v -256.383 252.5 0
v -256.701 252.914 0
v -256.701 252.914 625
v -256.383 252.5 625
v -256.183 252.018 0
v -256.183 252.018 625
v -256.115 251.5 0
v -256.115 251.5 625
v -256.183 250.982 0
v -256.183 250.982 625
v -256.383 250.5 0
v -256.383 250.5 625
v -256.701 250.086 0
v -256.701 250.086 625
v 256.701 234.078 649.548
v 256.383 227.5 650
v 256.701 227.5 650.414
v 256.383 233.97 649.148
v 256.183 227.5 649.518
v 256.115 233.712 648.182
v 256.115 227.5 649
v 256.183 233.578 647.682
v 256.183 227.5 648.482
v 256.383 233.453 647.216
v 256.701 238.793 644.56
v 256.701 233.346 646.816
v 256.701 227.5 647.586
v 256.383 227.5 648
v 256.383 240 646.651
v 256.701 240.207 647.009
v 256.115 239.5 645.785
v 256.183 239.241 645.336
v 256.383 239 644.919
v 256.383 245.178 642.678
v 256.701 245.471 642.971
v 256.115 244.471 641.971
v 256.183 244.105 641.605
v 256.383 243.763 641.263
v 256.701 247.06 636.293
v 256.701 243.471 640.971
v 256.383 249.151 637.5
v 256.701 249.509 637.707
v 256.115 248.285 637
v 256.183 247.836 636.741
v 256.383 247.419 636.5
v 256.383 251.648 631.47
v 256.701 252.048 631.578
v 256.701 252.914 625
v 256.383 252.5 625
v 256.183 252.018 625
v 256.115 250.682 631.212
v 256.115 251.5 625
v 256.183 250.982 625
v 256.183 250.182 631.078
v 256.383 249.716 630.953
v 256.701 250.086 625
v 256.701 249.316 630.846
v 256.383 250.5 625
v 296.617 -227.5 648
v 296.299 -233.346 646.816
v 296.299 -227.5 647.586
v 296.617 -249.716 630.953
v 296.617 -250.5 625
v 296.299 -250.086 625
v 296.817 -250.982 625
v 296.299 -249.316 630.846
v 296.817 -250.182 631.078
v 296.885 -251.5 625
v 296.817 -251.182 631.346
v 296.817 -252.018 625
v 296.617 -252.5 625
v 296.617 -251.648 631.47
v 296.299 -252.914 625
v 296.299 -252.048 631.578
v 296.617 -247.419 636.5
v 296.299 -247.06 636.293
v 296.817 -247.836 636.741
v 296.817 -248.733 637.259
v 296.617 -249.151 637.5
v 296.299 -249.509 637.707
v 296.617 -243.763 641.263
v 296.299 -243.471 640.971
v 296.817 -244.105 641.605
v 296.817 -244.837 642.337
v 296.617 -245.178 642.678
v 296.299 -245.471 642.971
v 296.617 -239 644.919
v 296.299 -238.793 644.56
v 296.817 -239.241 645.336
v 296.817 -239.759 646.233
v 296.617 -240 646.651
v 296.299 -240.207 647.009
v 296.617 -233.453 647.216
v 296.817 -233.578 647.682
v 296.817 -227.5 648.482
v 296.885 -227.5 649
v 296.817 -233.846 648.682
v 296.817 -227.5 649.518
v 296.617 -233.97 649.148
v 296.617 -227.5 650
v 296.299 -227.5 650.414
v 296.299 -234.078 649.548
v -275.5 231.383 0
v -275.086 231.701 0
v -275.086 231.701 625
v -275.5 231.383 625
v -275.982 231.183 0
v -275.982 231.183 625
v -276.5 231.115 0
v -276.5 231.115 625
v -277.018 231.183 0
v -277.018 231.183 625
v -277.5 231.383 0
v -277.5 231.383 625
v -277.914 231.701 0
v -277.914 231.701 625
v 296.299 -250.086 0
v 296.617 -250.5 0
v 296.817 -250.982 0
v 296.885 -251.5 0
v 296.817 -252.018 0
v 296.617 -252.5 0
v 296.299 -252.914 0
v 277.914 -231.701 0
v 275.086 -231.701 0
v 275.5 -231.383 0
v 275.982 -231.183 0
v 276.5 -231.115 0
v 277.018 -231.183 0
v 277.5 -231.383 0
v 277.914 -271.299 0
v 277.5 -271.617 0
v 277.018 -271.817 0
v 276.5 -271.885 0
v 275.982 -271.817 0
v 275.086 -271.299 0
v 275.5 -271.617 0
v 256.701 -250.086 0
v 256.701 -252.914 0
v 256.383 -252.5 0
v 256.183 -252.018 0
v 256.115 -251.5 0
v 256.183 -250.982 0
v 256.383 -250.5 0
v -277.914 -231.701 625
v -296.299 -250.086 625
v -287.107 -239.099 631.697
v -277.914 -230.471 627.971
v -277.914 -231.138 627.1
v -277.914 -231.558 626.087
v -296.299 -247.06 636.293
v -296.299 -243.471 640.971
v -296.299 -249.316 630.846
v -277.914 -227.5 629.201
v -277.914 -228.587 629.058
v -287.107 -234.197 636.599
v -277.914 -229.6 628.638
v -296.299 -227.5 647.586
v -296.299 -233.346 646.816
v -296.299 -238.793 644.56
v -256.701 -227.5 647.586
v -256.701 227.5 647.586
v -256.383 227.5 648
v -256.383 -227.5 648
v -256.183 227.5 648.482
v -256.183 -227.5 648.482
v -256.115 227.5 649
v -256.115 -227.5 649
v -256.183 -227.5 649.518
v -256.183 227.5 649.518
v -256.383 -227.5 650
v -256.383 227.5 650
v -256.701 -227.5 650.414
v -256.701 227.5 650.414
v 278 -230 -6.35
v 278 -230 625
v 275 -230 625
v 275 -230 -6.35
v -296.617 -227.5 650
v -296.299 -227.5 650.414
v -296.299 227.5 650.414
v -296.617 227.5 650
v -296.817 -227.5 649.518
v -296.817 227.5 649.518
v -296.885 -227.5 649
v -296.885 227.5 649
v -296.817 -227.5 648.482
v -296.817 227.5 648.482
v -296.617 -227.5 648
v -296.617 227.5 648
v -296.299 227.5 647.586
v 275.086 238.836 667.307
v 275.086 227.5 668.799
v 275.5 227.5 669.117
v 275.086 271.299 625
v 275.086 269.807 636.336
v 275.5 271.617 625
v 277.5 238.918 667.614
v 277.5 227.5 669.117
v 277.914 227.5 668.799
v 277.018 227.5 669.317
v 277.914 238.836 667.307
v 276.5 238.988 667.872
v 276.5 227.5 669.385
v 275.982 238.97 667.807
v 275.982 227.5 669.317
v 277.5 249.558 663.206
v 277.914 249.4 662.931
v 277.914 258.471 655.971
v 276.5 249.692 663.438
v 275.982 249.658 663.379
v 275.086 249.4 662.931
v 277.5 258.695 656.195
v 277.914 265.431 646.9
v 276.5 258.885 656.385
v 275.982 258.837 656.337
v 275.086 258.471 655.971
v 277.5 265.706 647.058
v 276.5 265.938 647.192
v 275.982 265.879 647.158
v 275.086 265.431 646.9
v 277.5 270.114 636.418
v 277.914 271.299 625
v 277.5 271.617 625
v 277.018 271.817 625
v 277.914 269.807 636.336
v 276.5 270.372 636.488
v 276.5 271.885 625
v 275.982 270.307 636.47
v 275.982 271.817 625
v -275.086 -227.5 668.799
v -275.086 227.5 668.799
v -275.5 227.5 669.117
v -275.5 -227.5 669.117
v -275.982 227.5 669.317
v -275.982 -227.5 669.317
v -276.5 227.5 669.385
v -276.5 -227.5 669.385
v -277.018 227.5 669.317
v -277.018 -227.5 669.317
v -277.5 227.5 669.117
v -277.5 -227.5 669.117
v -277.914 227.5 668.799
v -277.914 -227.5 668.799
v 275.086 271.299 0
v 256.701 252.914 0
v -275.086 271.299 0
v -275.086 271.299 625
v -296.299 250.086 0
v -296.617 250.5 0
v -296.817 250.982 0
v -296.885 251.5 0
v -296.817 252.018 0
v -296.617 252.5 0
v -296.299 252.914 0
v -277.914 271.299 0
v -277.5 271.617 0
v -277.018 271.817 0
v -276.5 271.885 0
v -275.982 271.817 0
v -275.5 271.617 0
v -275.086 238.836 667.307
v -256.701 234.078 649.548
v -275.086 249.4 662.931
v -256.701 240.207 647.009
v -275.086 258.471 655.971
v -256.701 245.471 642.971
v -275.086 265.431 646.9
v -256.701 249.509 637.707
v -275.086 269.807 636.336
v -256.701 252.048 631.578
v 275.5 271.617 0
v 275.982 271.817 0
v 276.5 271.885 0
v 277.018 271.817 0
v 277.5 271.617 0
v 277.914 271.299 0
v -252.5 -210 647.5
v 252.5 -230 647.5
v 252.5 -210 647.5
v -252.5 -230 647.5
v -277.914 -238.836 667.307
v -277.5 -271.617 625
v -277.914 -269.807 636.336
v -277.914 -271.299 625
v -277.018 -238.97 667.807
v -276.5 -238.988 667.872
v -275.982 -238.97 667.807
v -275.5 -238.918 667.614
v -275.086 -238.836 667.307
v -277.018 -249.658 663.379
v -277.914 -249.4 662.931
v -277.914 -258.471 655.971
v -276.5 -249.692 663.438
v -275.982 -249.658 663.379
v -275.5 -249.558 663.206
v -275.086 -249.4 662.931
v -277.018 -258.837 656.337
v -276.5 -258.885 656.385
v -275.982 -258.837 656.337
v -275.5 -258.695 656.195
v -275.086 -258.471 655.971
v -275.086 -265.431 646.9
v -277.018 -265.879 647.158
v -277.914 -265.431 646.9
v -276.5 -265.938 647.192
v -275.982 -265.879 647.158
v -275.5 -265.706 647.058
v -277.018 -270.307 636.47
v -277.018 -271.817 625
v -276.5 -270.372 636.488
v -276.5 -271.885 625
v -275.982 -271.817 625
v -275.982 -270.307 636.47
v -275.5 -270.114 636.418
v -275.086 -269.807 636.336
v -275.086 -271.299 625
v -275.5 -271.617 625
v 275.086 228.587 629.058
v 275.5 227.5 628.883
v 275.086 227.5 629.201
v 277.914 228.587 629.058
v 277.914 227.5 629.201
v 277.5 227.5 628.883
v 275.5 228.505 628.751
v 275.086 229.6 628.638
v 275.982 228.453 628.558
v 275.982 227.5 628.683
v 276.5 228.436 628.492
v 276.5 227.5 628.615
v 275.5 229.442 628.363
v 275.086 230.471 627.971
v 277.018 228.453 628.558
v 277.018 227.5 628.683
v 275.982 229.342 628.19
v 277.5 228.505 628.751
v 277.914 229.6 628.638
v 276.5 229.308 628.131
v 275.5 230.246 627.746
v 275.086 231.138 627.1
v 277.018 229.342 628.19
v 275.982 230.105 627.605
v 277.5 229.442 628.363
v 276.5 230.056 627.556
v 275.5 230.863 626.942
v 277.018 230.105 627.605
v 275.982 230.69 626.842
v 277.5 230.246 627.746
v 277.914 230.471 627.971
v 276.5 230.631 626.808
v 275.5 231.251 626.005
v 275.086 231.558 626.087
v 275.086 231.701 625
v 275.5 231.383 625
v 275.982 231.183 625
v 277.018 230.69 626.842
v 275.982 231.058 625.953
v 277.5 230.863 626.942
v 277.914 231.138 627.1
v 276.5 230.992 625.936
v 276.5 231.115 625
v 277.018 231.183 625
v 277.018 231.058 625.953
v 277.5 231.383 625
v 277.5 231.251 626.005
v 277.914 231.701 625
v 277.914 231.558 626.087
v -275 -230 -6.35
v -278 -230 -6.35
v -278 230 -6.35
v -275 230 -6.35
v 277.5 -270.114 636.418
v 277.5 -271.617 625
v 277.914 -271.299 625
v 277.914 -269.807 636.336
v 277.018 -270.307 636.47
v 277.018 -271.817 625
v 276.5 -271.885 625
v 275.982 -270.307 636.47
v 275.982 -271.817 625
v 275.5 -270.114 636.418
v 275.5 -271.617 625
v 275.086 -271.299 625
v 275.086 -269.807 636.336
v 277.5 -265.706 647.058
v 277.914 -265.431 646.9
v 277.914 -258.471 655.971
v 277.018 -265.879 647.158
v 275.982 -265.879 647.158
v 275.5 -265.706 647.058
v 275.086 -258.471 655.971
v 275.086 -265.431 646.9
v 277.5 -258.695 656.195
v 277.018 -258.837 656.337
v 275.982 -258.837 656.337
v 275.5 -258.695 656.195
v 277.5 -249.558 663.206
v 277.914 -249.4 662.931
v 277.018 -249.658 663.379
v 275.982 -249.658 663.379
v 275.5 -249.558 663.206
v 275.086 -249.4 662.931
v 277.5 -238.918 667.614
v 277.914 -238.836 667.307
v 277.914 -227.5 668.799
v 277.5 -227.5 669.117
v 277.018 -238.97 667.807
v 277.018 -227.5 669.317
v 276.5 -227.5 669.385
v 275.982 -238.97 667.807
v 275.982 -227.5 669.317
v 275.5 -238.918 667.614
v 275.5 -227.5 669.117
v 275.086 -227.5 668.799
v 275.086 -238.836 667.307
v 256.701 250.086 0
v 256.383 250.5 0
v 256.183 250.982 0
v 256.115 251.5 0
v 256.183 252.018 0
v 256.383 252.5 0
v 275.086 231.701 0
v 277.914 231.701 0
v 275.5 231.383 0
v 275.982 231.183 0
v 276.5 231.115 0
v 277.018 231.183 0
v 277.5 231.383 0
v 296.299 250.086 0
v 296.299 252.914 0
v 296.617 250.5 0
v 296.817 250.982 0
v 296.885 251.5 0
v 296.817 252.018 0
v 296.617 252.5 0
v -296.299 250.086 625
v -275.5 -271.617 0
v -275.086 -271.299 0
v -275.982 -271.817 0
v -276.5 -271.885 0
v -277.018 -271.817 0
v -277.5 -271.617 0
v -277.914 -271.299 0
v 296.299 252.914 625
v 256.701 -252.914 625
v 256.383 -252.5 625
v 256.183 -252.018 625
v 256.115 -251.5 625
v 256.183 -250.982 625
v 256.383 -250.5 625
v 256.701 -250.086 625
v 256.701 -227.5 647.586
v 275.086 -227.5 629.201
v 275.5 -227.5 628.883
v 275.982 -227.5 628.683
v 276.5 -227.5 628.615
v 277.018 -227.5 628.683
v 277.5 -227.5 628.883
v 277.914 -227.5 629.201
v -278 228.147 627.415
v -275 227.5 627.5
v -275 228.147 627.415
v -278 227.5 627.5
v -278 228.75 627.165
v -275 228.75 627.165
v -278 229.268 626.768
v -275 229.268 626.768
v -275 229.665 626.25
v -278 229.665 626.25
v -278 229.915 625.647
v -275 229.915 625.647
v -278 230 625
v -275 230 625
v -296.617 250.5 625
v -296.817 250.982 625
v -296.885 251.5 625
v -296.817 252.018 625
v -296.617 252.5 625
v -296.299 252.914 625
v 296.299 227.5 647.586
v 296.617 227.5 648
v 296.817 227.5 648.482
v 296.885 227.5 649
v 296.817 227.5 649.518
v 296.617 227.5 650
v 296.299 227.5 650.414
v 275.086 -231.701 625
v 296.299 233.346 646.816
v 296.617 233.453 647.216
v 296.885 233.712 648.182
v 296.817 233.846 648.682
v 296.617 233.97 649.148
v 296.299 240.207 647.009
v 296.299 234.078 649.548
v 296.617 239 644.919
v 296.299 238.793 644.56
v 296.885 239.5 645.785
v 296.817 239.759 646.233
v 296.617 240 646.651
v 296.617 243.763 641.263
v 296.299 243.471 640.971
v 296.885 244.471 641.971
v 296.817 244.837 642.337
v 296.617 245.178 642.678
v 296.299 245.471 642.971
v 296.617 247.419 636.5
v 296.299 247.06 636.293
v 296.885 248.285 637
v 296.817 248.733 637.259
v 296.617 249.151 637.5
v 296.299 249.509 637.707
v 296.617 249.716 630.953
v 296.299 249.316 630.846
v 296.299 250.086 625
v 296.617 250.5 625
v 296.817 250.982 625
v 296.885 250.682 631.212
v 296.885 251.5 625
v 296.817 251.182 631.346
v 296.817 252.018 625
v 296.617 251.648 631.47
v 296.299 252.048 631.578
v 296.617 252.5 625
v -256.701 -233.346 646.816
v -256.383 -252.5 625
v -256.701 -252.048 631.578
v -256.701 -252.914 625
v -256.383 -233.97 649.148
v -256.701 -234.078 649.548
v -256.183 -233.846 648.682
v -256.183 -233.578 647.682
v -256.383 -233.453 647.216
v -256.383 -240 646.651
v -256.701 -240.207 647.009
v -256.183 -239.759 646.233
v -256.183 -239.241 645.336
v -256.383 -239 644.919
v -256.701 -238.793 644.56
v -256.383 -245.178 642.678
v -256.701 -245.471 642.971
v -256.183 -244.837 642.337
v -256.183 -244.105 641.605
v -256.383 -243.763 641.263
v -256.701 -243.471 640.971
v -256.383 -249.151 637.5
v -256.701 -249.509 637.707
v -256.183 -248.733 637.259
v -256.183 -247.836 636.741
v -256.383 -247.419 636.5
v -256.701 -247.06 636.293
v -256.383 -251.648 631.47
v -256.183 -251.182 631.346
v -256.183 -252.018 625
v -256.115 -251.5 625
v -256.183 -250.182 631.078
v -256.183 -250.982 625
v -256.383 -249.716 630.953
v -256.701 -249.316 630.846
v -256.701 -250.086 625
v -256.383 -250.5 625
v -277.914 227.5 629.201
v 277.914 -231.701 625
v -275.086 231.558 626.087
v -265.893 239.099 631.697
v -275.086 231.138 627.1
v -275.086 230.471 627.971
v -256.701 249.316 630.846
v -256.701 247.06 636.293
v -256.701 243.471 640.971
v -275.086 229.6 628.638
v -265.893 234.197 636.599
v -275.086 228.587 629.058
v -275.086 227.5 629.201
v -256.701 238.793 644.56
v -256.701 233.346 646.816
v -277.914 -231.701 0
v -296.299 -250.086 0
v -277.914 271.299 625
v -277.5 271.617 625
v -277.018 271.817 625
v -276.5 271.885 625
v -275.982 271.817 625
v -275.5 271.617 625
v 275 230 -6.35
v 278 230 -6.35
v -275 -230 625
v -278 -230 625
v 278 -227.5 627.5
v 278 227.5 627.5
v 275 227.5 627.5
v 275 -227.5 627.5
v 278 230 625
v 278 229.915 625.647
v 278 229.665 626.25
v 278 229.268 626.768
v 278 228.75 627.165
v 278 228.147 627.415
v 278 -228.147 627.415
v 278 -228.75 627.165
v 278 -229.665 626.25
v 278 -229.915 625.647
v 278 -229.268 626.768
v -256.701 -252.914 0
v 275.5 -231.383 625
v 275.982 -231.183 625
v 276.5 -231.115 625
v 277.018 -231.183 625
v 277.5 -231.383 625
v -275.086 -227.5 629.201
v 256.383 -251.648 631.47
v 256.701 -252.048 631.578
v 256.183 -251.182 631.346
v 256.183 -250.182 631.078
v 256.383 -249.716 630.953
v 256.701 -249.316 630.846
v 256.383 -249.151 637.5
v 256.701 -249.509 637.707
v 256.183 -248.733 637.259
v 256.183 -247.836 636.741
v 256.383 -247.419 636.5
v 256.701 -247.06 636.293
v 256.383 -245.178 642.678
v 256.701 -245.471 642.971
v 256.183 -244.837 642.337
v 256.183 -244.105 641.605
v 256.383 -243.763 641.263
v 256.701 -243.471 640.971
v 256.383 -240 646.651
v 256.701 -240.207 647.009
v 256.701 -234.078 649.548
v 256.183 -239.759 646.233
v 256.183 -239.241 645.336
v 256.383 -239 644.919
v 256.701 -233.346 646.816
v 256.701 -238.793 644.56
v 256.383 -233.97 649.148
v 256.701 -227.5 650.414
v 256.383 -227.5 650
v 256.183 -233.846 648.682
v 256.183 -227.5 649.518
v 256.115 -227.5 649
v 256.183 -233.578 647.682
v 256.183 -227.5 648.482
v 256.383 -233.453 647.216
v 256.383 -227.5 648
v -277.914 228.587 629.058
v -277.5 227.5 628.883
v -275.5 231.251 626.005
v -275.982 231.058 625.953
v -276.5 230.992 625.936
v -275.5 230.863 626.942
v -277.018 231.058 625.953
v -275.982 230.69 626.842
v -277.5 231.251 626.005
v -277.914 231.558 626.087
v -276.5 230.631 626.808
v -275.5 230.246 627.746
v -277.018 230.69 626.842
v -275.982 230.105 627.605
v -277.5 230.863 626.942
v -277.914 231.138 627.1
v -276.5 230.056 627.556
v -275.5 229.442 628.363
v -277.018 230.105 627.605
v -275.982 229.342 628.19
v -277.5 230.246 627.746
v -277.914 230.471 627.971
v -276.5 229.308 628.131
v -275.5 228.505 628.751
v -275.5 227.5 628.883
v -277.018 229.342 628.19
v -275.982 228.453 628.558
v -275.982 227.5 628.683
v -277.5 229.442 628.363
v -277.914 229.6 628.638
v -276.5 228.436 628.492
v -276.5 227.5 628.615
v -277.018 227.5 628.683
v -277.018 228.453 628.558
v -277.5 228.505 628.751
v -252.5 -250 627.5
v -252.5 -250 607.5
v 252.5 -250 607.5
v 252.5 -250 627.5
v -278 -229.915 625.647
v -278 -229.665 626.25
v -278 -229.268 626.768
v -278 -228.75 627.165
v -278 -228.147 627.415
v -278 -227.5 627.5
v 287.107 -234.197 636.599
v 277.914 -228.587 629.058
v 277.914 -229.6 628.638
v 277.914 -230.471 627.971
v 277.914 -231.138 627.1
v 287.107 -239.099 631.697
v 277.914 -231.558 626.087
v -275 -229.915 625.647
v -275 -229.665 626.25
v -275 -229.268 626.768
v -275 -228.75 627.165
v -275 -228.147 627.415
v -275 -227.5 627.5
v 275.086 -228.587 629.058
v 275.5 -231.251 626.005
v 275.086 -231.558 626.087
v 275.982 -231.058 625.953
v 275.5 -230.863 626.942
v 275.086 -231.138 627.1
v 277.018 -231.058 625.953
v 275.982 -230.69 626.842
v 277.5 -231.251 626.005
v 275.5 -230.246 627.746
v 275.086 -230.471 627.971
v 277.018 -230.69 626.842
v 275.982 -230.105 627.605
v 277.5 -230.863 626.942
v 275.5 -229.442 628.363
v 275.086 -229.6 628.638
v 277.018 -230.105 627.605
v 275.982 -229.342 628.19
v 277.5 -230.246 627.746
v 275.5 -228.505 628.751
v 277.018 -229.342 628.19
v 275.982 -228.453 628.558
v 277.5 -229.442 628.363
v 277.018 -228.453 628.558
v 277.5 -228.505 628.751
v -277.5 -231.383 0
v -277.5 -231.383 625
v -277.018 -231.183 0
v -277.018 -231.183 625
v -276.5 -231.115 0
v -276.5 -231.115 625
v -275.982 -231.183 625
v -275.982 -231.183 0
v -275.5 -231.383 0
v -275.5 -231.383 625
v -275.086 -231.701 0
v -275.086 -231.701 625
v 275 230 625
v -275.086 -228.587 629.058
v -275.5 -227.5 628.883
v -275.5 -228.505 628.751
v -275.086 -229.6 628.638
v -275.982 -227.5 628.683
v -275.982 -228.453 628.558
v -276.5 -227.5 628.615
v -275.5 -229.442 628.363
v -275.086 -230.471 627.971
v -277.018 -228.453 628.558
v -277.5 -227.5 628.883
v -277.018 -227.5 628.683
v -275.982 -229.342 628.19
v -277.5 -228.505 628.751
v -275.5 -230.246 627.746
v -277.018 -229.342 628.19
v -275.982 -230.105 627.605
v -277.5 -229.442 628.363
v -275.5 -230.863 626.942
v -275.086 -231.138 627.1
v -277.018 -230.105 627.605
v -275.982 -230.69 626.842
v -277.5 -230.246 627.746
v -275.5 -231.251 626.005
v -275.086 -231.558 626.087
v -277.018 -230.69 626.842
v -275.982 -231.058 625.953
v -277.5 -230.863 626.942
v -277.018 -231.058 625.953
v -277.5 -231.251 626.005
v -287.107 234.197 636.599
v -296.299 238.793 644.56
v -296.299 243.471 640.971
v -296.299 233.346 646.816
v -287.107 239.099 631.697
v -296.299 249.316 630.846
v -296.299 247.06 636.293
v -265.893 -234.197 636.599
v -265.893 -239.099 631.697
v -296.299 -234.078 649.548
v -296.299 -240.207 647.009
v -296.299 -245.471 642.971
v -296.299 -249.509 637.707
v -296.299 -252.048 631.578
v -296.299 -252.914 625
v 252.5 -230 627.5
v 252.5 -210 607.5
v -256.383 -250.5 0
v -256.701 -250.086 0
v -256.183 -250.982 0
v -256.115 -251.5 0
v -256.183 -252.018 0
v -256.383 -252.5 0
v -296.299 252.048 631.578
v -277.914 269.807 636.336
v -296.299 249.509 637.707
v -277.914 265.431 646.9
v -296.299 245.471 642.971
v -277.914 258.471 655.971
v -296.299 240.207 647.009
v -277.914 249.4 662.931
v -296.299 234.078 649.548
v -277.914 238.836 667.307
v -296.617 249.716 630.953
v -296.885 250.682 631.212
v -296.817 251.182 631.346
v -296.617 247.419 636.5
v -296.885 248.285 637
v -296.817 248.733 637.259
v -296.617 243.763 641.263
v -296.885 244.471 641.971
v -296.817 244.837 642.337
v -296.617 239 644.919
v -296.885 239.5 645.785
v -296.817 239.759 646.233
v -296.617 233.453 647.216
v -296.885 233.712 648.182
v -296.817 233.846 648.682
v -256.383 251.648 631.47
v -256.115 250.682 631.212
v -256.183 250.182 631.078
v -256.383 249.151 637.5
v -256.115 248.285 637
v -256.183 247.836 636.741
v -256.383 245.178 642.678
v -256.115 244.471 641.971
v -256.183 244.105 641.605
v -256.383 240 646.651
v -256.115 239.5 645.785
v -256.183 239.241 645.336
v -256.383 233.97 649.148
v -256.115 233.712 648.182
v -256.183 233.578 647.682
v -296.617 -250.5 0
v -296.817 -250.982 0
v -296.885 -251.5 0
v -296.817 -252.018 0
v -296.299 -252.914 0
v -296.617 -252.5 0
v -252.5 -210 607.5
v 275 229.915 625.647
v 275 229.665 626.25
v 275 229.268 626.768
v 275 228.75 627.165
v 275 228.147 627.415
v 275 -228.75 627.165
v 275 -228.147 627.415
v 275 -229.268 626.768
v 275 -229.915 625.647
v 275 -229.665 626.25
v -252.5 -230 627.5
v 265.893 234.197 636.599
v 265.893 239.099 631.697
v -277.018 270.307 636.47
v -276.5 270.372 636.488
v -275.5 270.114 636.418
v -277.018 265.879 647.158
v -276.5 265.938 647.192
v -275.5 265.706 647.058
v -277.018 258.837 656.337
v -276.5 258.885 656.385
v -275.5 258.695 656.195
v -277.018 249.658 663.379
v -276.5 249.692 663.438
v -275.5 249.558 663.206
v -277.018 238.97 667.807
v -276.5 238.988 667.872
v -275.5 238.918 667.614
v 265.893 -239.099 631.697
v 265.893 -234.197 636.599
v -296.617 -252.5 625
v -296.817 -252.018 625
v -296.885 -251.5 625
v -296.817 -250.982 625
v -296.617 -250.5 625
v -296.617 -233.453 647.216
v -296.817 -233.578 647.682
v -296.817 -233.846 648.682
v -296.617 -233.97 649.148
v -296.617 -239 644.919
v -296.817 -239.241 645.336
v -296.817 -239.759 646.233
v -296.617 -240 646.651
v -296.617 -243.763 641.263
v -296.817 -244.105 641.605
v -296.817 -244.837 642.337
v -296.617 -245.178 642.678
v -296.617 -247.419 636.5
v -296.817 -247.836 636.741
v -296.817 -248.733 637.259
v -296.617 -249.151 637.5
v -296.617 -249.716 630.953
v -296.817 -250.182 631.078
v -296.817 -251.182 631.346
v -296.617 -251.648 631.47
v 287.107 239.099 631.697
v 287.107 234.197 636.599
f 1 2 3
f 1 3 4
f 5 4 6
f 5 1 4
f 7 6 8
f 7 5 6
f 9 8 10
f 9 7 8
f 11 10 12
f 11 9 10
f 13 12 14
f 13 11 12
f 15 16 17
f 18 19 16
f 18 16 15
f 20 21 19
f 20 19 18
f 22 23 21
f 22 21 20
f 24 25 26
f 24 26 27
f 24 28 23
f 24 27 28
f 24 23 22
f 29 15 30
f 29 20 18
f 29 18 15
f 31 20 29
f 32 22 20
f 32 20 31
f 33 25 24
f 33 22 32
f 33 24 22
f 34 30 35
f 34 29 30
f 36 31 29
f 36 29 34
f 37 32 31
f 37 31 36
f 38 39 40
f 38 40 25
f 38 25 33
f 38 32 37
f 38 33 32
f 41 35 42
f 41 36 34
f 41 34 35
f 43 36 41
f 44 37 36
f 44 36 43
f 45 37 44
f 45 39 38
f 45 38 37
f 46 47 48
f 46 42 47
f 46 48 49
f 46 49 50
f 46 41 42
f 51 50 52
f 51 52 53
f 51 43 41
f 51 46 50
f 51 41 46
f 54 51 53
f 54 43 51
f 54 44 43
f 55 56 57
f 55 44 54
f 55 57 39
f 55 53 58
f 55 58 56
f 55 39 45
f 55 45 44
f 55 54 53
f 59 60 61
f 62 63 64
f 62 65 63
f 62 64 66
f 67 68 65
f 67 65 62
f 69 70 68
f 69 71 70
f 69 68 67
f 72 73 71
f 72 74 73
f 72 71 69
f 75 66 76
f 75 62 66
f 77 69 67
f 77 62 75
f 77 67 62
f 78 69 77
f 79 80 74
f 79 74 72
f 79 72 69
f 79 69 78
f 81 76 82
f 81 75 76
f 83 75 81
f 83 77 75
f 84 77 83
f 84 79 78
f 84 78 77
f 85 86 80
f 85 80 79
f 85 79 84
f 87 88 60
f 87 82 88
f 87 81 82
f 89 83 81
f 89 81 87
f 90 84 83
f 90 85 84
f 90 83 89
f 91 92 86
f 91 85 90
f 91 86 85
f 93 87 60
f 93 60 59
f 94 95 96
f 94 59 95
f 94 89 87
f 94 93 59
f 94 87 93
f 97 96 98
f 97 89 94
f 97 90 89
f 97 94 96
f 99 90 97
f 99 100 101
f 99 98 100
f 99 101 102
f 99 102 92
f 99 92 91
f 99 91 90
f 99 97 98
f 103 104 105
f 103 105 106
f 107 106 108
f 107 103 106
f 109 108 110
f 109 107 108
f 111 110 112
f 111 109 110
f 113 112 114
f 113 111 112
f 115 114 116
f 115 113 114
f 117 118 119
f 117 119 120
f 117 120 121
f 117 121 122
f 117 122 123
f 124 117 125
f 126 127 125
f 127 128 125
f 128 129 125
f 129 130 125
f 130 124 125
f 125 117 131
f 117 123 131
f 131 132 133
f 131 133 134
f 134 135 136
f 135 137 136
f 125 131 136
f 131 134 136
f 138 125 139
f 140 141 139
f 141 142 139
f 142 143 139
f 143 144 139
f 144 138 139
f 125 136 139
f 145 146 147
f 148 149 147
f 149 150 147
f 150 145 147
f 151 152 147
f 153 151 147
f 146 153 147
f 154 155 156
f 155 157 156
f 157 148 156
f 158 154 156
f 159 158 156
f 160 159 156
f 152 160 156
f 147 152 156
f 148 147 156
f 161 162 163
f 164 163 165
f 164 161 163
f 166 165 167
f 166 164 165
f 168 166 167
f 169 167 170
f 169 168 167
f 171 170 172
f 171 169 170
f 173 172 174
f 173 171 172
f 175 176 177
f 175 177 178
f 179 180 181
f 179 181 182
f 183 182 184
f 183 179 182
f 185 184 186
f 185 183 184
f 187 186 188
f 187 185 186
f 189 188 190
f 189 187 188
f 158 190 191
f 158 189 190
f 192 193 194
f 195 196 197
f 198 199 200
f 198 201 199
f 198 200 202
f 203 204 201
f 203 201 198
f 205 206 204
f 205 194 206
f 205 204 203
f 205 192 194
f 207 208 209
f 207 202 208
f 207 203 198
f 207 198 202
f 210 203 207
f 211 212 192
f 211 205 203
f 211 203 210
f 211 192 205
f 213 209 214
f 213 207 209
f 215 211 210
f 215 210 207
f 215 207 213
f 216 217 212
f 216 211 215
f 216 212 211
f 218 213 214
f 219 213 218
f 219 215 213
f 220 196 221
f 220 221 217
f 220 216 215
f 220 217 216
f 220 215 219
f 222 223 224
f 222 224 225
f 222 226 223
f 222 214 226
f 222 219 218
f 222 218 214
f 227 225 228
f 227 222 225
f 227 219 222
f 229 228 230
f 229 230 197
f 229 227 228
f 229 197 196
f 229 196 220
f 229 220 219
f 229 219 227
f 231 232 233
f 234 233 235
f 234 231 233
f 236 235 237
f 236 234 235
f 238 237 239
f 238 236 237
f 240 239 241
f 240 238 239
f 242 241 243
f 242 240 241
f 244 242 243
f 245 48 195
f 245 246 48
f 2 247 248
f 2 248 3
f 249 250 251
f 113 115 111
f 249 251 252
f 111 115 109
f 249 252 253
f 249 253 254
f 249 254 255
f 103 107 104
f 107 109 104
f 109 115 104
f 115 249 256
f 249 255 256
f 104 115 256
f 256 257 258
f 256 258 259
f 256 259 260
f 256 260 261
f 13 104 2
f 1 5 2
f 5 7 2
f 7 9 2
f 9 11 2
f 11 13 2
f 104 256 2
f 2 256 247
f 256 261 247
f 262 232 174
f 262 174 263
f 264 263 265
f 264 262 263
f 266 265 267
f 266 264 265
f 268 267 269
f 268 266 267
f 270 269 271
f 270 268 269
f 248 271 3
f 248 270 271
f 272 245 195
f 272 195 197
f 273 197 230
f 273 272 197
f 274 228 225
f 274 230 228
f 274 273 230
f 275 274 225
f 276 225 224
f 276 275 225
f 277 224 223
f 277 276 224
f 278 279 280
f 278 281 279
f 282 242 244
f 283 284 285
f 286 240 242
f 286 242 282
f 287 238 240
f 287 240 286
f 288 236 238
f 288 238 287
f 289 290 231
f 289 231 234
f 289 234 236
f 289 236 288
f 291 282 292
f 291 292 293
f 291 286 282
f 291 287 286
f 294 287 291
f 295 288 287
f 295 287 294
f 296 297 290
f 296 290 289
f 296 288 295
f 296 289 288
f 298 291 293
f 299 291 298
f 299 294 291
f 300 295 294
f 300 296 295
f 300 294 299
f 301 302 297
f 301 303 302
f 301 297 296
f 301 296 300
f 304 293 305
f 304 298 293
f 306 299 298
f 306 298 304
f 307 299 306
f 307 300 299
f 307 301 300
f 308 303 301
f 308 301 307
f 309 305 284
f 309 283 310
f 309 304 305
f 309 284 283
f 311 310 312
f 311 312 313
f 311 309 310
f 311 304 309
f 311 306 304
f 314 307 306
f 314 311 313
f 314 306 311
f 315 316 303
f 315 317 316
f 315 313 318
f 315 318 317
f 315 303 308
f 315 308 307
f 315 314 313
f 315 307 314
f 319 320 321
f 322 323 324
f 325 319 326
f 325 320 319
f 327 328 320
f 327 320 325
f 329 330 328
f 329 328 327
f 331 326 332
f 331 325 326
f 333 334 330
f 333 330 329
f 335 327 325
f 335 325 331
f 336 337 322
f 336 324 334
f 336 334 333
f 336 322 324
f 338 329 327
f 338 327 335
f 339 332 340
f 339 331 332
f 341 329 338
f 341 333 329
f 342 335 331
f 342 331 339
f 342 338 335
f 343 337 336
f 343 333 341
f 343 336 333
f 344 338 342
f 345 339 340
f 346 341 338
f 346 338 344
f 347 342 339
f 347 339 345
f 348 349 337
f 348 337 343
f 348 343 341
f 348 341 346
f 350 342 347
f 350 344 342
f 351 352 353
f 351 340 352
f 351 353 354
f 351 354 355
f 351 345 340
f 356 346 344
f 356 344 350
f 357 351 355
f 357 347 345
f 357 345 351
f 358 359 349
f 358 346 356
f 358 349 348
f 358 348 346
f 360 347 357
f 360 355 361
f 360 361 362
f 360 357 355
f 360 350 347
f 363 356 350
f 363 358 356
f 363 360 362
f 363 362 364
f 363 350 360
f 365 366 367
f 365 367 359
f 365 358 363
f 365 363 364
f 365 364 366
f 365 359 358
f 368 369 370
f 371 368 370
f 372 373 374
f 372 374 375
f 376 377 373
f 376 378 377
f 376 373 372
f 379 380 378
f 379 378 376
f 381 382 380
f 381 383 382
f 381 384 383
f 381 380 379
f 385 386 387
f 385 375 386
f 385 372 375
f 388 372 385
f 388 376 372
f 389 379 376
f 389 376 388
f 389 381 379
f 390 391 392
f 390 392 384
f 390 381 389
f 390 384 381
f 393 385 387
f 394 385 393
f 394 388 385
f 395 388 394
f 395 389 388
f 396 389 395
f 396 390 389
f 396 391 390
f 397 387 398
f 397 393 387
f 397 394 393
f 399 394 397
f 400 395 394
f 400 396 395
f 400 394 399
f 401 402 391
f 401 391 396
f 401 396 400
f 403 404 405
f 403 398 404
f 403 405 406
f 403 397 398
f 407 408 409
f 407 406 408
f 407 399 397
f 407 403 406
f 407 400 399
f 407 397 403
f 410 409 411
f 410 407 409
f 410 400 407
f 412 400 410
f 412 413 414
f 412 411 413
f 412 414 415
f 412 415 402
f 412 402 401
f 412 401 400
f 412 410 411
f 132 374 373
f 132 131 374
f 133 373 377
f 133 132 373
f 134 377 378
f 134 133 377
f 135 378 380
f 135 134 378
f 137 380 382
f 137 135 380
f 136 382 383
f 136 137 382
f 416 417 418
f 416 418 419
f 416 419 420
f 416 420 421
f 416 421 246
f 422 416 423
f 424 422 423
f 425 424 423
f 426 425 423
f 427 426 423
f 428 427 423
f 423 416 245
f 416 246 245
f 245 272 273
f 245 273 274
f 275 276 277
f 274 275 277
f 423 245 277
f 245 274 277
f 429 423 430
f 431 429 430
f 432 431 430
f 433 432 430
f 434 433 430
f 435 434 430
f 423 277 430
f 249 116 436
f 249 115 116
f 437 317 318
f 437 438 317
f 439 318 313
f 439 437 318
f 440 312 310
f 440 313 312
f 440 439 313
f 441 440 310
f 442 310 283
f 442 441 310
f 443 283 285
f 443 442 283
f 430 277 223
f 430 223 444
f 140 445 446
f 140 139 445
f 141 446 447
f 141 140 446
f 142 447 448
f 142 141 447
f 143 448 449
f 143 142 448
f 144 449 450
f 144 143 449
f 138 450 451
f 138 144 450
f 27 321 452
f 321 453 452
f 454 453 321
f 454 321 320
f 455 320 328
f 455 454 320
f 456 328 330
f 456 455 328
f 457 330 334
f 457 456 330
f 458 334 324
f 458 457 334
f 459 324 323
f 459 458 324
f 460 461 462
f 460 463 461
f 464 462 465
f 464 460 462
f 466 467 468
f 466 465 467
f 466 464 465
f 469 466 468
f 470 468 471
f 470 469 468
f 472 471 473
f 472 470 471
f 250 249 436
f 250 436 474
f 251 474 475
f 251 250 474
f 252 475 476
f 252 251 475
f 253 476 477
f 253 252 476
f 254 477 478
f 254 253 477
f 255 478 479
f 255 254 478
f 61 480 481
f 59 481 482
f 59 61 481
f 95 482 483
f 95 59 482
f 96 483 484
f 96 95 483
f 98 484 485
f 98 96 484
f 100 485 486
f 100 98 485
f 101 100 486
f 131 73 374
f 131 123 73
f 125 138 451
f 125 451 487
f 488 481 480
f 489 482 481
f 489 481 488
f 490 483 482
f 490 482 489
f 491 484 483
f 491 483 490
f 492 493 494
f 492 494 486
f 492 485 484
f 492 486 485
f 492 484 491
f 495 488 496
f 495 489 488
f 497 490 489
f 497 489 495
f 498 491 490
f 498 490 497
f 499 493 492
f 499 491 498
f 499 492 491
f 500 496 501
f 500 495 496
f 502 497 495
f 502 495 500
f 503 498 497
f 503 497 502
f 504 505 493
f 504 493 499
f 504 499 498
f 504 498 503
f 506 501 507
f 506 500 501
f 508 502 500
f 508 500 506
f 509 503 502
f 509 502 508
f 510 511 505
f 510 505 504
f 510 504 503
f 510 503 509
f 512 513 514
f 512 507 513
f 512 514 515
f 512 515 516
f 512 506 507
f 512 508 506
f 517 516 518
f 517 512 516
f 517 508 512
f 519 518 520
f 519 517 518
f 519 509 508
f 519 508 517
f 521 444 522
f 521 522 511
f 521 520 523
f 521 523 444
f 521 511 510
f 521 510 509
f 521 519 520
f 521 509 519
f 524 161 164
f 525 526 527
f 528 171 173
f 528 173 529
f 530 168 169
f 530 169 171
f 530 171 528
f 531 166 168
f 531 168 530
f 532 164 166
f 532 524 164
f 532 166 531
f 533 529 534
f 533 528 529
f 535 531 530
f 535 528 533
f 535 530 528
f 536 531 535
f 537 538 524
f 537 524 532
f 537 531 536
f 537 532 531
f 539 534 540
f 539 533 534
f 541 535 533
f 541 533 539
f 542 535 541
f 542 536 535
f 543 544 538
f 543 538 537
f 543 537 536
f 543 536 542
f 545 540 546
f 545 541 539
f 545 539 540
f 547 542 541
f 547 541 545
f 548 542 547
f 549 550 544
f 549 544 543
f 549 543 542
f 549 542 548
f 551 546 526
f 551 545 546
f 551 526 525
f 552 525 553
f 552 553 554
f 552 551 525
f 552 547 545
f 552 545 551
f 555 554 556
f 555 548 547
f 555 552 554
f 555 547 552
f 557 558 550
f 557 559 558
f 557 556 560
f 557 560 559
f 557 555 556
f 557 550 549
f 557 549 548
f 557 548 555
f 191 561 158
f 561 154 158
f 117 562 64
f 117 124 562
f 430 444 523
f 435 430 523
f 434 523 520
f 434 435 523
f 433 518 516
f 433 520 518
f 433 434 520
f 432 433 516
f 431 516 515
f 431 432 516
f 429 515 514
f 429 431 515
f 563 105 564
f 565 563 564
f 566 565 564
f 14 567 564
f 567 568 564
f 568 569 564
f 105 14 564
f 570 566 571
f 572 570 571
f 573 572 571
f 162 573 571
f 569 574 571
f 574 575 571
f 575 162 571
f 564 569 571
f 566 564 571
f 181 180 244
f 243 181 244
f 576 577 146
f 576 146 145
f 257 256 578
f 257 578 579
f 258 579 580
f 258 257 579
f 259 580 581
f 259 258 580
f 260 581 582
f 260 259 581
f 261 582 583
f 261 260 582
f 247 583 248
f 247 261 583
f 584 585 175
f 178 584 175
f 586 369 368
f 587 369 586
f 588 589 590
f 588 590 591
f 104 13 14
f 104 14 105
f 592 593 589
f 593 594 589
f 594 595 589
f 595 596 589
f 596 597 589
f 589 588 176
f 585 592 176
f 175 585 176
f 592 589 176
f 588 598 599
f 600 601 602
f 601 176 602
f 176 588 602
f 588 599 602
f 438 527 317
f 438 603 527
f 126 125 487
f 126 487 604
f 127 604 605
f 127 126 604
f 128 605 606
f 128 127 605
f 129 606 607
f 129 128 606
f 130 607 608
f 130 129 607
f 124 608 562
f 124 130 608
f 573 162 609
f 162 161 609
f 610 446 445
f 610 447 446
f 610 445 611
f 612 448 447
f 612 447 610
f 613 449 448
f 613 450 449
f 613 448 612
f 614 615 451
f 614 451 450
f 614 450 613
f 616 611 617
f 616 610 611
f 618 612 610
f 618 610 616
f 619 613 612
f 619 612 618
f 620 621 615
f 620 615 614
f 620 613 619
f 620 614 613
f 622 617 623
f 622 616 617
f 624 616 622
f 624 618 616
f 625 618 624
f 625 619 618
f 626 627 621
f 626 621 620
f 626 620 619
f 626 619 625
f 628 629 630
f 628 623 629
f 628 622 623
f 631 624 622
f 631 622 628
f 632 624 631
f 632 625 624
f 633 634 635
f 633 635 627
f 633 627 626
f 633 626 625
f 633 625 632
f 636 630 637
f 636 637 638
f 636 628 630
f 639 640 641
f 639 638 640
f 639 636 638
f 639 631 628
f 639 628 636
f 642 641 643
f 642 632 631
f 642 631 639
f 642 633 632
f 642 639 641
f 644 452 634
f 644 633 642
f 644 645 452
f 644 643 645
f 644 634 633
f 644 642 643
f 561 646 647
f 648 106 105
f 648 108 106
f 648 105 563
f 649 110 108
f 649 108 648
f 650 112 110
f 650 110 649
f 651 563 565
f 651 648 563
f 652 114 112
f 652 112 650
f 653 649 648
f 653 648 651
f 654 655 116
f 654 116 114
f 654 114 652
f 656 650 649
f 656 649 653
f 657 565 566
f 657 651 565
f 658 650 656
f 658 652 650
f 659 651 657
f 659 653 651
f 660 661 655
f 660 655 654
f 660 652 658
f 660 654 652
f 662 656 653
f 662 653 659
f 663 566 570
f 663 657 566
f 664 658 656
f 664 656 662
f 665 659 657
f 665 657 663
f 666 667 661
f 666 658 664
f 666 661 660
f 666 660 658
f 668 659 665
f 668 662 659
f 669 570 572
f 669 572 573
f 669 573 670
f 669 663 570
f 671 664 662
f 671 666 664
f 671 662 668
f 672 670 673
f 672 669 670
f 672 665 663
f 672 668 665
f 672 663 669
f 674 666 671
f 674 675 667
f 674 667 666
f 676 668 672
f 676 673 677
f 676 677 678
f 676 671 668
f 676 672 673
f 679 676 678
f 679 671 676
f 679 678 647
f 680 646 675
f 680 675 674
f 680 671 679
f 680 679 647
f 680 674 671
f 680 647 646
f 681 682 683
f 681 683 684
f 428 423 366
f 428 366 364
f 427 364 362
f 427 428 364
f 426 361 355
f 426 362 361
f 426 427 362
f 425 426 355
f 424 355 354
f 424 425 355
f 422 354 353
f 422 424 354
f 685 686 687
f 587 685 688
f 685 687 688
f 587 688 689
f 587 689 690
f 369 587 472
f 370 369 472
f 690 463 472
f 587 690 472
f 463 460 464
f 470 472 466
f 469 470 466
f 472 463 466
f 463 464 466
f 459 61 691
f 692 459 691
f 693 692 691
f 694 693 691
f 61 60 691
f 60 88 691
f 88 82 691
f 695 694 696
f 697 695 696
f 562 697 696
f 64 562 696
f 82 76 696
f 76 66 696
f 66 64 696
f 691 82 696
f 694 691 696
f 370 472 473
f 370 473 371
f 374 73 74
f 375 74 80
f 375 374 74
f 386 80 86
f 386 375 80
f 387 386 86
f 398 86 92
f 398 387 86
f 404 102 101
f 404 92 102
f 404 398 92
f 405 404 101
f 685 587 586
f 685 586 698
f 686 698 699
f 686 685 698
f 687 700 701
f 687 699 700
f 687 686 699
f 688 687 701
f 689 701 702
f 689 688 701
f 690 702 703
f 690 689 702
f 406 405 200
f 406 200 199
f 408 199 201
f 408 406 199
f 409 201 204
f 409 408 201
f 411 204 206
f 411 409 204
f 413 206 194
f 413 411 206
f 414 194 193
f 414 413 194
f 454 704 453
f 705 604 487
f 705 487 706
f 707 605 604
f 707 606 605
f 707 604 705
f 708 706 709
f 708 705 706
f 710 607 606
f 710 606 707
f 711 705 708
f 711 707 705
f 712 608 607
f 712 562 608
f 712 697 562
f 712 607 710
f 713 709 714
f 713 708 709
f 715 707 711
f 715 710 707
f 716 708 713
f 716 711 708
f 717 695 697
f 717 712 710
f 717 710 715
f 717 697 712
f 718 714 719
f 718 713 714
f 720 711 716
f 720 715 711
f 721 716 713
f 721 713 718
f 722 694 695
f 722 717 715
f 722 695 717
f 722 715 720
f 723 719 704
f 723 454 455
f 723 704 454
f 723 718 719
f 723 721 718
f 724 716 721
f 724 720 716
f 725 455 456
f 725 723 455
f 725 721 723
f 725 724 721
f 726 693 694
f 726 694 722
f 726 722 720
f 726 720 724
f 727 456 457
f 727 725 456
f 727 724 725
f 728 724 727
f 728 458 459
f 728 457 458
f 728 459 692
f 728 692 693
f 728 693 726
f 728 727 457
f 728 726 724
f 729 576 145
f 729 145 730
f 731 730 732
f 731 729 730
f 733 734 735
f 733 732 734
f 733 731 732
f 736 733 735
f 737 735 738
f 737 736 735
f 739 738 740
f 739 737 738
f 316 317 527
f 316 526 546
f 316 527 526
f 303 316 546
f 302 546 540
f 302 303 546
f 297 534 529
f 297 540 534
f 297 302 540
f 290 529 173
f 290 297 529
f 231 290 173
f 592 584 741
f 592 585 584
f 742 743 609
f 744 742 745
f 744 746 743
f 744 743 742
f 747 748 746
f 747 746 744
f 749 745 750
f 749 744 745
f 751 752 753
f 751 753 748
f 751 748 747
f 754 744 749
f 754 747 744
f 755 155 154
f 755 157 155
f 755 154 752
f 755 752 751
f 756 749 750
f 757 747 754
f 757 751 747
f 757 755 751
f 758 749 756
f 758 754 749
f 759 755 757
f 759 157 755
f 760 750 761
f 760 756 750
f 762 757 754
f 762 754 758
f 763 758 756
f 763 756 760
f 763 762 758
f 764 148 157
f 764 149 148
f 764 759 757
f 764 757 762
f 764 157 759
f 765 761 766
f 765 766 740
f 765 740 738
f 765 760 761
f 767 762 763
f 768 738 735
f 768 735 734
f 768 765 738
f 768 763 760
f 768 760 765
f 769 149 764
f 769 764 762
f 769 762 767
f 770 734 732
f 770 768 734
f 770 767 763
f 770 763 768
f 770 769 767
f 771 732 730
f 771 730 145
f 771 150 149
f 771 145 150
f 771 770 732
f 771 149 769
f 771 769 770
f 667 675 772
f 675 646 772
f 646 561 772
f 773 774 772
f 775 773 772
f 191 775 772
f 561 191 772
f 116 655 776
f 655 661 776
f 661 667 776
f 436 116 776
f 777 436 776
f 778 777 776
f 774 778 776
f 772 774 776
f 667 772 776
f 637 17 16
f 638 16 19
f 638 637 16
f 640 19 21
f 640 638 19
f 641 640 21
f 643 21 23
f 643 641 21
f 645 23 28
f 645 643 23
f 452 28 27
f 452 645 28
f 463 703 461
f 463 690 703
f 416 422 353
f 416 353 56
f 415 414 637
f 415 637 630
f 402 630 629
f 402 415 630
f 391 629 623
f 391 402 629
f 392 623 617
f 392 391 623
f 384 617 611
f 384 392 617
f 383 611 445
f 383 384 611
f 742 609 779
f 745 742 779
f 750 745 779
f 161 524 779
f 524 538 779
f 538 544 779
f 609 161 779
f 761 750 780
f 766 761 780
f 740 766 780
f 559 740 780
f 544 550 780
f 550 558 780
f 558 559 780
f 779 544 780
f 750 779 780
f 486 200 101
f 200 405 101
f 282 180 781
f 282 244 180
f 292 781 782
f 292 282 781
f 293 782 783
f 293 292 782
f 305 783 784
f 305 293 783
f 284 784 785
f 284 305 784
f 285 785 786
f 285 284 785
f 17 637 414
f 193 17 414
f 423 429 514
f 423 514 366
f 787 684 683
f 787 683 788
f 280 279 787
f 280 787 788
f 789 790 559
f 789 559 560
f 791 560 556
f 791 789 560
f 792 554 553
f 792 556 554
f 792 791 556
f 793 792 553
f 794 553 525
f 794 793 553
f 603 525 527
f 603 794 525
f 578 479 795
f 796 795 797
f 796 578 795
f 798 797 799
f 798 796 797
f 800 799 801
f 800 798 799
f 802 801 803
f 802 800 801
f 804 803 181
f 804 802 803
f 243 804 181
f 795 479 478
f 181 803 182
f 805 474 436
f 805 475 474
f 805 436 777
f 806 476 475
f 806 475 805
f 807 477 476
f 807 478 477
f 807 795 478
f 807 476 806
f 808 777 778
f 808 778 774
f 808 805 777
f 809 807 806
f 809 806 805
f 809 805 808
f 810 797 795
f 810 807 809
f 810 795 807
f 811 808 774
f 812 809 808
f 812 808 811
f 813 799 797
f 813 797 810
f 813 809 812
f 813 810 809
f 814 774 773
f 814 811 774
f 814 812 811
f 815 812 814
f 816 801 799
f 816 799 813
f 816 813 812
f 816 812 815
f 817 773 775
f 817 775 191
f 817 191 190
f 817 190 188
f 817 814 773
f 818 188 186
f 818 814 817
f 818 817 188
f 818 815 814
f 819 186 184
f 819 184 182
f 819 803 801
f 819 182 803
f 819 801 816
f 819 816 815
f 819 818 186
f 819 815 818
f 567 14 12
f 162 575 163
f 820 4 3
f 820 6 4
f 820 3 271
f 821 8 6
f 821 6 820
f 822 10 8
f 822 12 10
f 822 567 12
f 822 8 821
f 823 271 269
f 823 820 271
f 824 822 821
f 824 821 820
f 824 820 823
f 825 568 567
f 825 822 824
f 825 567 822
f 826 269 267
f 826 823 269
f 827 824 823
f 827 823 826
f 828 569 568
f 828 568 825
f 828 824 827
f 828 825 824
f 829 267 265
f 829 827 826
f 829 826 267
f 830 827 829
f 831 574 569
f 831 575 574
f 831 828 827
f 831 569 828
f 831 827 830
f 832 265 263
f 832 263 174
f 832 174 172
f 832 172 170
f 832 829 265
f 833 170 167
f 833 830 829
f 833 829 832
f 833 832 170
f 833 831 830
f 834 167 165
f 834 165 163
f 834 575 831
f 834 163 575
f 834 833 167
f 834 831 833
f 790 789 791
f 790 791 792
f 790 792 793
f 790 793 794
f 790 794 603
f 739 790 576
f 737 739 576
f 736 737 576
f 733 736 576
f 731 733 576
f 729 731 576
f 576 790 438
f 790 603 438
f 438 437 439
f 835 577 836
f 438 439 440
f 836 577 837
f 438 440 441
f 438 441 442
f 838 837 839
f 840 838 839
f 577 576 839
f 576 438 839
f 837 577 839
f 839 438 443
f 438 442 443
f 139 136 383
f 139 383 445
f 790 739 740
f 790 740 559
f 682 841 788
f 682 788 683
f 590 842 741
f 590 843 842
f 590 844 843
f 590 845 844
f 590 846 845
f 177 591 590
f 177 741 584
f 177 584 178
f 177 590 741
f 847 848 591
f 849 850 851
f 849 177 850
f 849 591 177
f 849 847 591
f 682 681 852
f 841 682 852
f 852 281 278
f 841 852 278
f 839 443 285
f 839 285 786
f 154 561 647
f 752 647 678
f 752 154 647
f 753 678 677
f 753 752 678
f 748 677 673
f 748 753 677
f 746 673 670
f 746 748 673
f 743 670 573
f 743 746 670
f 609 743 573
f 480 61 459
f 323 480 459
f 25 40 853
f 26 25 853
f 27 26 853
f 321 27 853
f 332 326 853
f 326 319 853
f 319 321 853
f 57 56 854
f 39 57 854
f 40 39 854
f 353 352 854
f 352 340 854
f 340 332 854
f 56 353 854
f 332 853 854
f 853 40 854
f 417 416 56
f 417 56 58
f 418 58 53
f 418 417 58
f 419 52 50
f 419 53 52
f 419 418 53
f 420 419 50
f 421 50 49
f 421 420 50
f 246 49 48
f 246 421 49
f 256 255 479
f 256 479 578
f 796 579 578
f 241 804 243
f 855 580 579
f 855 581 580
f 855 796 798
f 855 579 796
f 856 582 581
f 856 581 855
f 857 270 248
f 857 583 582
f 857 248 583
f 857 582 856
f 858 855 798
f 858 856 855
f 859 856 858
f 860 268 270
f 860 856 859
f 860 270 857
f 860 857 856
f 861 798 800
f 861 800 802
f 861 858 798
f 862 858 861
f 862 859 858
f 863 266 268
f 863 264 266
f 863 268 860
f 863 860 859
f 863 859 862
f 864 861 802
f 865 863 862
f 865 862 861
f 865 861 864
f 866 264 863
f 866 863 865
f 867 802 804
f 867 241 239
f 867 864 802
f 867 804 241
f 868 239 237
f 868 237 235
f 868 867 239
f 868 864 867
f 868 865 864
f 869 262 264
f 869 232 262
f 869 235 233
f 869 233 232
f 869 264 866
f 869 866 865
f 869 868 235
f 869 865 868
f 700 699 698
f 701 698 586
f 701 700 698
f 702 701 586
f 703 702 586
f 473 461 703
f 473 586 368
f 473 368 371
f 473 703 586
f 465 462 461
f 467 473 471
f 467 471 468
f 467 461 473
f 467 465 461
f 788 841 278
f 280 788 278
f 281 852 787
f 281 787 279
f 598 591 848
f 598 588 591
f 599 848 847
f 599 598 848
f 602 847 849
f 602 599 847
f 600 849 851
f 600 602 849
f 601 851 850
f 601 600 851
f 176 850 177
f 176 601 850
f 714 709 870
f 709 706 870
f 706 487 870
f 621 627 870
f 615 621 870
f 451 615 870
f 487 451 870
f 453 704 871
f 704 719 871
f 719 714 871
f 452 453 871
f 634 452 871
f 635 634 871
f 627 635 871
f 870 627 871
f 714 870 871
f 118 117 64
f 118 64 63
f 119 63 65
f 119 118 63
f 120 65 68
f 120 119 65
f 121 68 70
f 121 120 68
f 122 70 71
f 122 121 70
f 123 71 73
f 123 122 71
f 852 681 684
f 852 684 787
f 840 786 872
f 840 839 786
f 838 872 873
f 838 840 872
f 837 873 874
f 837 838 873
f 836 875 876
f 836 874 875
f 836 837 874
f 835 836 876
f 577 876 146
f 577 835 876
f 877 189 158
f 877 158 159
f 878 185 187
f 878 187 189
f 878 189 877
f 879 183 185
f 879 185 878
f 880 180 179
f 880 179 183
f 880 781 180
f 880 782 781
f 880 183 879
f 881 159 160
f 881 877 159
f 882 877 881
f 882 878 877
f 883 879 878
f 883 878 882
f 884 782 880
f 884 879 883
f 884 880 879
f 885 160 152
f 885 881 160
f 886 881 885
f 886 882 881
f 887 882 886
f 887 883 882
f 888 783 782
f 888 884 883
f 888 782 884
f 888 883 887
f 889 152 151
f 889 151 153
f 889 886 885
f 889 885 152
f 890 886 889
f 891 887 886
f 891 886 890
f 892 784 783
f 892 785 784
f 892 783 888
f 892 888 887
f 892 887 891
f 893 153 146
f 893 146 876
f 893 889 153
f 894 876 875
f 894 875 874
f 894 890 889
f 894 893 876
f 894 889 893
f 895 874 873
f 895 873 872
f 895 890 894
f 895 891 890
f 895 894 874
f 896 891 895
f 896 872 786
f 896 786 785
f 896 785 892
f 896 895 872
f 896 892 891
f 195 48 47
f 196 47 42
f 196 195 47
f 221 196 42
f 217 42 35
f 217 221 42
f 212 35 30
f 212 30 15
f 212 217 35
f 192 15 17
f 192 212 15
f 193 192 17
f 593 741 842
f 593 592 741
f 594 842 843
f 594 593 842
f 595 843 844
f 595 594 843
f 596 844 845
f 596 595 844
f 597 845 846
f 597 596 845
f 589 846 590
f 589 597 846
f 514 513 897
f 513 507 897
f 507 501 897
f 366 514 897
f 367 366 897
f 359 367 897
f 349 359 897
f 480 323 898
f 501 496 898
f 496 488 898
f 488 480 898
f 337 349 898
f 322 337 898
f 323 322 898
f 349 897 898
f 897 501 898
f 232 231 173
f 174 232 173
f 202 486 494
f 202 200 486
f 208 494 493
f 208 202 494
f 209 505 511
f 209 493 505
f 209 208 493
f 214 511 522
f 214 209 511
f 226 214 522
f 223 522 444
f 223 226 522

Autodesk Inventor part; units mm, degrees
ref_plane "YZ Plane" through (0, 0, 0) normal (1, 0, 0) x (0, 1, 0)
ref_plane "XZ Plane" through (0, 0, 0) normal (0, 1, 0) x (-1, 0, 0)
sketch "Sketch1" plane through (0, 0, 0) normal (0, 0, 1) x (1, 0, 0)
  line L0 (276.5, -251.5) -> (-276.5, -251.5) construction
  line L1 (-276.5, -251.5) -> (-276.5, 251.5) construction
  line L2 (-276.5, 251.5) -> (276.5, 251.5) construction
  line L3 (276.5, 251.5) -> (276.5, -251.5) construction
  line L4 (276.5, -251.5) -> (-276.5, 251.5) construction
  line L5 (-276.5, -251.5) -> (276.5, 251.5) construction
  line L6 (275.0858, 231.701) -> (256.701, 250.0858)
  line L7 (256.701, 252.9142) -> (275.0858, 271.299)
  line L8 (277.9142, 271.299) -> (296.299, 252.9142)
  line L9 (296.299, 250.0858) -> (277.9142, 231.701)
  line L10 (276.5, 230.2868) -> (276.5, 272.7132) construction
  line L11 (255.2868, 251.5) -> (297.7132, 251.5) construction
  arc A0 (256.701, 252.9142) -> (256.701, 250.0858) centre (258.1152, 251.5) ccw
  arc A1 (277.9142, 271.299) -> (275.0858, 271.299) centre (276.5, 269.8848) ccw
  arc A2 (296.299, 250.0858) -> (296.299, 252.9142) centre (294.8848, 251.5) ccw
  arc A3 (275.0858, 231.701) -> (277.9142, 231.701) centre (276.5, 233.1152) ccw
  point P0 (0, 0)
  dimension "d0" = 553
  dimension "d1" = 503
  dimension "d2" = 30
  dimension "d3" = 2
extrude "Extrusion1" add sketch "Sketch1" along normal blind 625
mirror "Mirror1" about plane through (0, 0, 0) normal (1, 0, 0) of "Extrusion1"
mirror "Mirror2" about plane through (0, 0, 0) normal (0, 1, 0) of "Extrusion1", "Mirror1"
ref_plane "Work Plane1" through (-276.5, -251.5, 0) normal (1, 0, 0) x (0, 1, 0)
sketch "Sketch2" plane through (-276.5, -251.5, 0) normal (1, 0, 0) x (0, 1, 0)
  line L0 (523.3848, 625) -> (523.3848, 0) projected
  line L1 (523.3848, 0) -> (482.6152, 0) projected
  line L2 (482.6152, 0) -> (482.6152, 625) projected
  line L3 (482.6152, 625) -> (523.3848, 625) projected
  line L4 (-20.3848, 0) -> (-20.3848, 625) projected
  line L5 (-20.3848, 625) -> (20.3848, 625) projected
  line L6 (20.3848, 625) -> (20.3848, 0) projected
  line L7 (20.3848, 0) -> (-20.3848, 0) projected
  line L8 (479, 649) -> (24, 649)
  arc A0 (503, 625) -> (479, 649) centre (479, 625) ccw
  arc A1 (24, 649) -> (0, 625) centre (24, 625) ccw
  line L9 (24, 628.6152) -> (479, 628.6152) construction
  line L10 (479, 628.6152) -> (479, 669.3848) construction
  line L11 (479, 669.3848) -> (24, 669.3848) construction
  line L12 (24, 669.3848) -> (24, 628.6152) construction
  line L13 (24, 628.6152) -> (479, 669.3848) construction
  line L14 (479, 628.6152) -> (24, 669.3848) construction
  line L15 (21.5, 607.5) -> (41.5, 607.5)
  line L16 (41.5, 607.5) -> (41.5, 647.5)
  line L17 (41.5, 647.5) -> (21.5, 647.5)
  line L18 (21.5, 647.5) -> (21.5, 607.5)
  line L19 (41.5, 607.5) -> (1.5, 607.5)
  line L20 (1.5, 607.5) -> (1.5, 627.5)
  line L21 (1.5, 627.5) -> (41.5, 627.5)
  line L22 (41.5, 627.5) -> (41.5, 607.5)
  point P0 (251.5, 0)
  point P1 (251.5, 649)
  dimension "d8" = 455
  dimension "d16" = 20
  dimension "d17" = 40
  dimension "d18" = 40
  dimension "d19" = 20
  dimension "d20" = 1.5
  dimension "d21" = 1.5
  dimension "d22" = 2.5
sketch "Sketch3" plane through (-276.5, -269.8848, 625) normal (0, 0, 1) x (1, 0, 0)
  line L0 (-19.799, 16.9706) -> (-1.4142, -1.4142) projected
  arc A0 (-1.4142, -1.4142) -> (1.4142, -1.4142) centre (0, 0) ccw projected
  line L1 (1.4142, -1.4142) -> (19.799, 16.9706) projected
  arc A1 (19.799, 16.9706) -> (19.799, 19.799) centre (18.3848, 18.3848) ccw projected
  line L2 (19.799, 19.799) -> (1.4142, 38.1838) projected
  arc A2 (1.4142, 38.1838) -> (-1.4142, 38.1838) centre (0, 36.7696) ccw projected
  line L3 (-1.4142, 38.1838) -> (-19.799, 19.799) projected
  arc A3 (-19.799, 19.799) -> (-19.799, 16.9706) centre (-18.3848, 18.3848) ccw projected
  point P0 (276.5, 269.8848)
sweep "Sweep1" add profiles "Sketch3" path "Sketch2" path curves A1 L8 A0
mirror "Mirror3" about plane through (0, 0, 0) normal (1, 0, 0) of "Sweep1"
sketch "Sketch4" plane through (-276.5, -251.5, 0) normal (1, 0, 0) x (0, 1, 0)
  arc A0 (523.3848, 625) -> (479, 669.3848) centre (479, 625) ccw projected
  line L0 (523.3848, 625) -> (523.3848, 0) projected
  line L1 (523.3848, 0) -> (482.6152, 0) projected
  line L2 (482.6152, 0) -> (482.6152, 625) projected
  arc A1 (482.6152, 625) -> (479, 628.6152) centre (479, 625) ccw projected
  line L3 (479, 628.6152) -> (24, 628.6152) projected
  arc A2 (24, 628.6152) -> (20.3848, 625) centre (24, 625) ccw projected
  line L4 (20.3848, 625) -> (20.3848, 0) projected
  line L5 (20.3848, 0) -> (-20.3848, 0) projected
  line L6 (-20.3848, 0) -> (-20.3848, 625) projected
  arc A3 (24, 669.3848) -> (-20.3848, 625) centre (24, 625) ccw projected
  line L7 (24, 669.3848) -> (479, 669.3848) projected
  arc A4 (24, 627.5) -> (21.5, 625) centre (24, 625) ccw
  line L8 (24, 627.5) -> (479, 627.5)
  arc A5 (481.5, 625) -> (479, 627.5) centre (479, 625) ccw
  line L9 (481.5, 625) -> (481.5, -1.1152)
  line L10 (481.5, -1.1152) -> (524.5, -1.1152)
  line L11 (524.5, -1.1152) -> (524.5, 625)
  arc A6 (524.5, 625) -> (479, 670.5) centre (479, 625) ccw
  line L12 (479, 670.5) -> (24, 670.5)
  arc A7 (24, 670.5) -> (-21.5, 625) centre (24, 625) ccw
  line L13 (-21.5, 625) -> (-21.5, -1.1152)
  line L14 (-21.5, -1.1152) -> (21.5, -1.1152)
  line L15 (21.5, -1.1152) -> (21.5, 625)
  line L16 (481.5, -1.1152) -> (21.5, -1.1152)
  line L17 (21.5, -1.1152) -> (21.5, -6.35)
  line L18 (21.5, -6.35) -> (481.5, -6.35)
  line L19 (481.5, -6.35) -> (481.5, -1.1152)
  point P0 (251.5, 0)
  dimension "d11" = 460
  dimension "d12" = 1.1152
  dimension "d13" = 6.35
extrude "Extrusion2" add sketch "Sketch4" along normal mid plane 3 separate body contours L8 A5 L9 L16 L15 A4 | L16 L19 L18 L17
mirror "Mirror4" about plane through (0, 0, 0) normal (1, 0, 0) of "Extrusion2" bodies 2
sketch "Sketch5" plane through (0, 0, 0) normal (1, 0, 0) x (0, 1, 0)
  line L0 (-210, 607.5) -> (-210, 647.5) projected
  line L1 (-210, 607.5) -> (-250, 607.5) projected
  line L2 (-210, 607.5) -> (-230, 607.5)
  line L3 (-230, 607.5) -> (-230, 647.5)
  line L4 (-230, 647.5) -> (-210, 647.5)
  line L5 (-210, 647.5) -> (-210, 607.5)
  line L6 (-210, 607.5) -> (-250, 607.5)
  line L7 (-250, 607.5) -> (-250, 627.5)
  line L8 (-250, 627.5) -> (-210, 627.5)
  line L9 (-210, 627.5) -> (-210, 607.5)
  point P0 (0, 0)
  point P1 (-230, 627.5)
  point P2 (-250, 607.5)
  dimension "d23" = 20
  dimension "d24" = 40
  dimension "d25" = 40
  dimension "d26" = 20
extrude "Extrusion3" add sketch "Sketch5" along normal mid plane 505 separate body
properties part number "Frame Test" material "Aluminum 6061"
